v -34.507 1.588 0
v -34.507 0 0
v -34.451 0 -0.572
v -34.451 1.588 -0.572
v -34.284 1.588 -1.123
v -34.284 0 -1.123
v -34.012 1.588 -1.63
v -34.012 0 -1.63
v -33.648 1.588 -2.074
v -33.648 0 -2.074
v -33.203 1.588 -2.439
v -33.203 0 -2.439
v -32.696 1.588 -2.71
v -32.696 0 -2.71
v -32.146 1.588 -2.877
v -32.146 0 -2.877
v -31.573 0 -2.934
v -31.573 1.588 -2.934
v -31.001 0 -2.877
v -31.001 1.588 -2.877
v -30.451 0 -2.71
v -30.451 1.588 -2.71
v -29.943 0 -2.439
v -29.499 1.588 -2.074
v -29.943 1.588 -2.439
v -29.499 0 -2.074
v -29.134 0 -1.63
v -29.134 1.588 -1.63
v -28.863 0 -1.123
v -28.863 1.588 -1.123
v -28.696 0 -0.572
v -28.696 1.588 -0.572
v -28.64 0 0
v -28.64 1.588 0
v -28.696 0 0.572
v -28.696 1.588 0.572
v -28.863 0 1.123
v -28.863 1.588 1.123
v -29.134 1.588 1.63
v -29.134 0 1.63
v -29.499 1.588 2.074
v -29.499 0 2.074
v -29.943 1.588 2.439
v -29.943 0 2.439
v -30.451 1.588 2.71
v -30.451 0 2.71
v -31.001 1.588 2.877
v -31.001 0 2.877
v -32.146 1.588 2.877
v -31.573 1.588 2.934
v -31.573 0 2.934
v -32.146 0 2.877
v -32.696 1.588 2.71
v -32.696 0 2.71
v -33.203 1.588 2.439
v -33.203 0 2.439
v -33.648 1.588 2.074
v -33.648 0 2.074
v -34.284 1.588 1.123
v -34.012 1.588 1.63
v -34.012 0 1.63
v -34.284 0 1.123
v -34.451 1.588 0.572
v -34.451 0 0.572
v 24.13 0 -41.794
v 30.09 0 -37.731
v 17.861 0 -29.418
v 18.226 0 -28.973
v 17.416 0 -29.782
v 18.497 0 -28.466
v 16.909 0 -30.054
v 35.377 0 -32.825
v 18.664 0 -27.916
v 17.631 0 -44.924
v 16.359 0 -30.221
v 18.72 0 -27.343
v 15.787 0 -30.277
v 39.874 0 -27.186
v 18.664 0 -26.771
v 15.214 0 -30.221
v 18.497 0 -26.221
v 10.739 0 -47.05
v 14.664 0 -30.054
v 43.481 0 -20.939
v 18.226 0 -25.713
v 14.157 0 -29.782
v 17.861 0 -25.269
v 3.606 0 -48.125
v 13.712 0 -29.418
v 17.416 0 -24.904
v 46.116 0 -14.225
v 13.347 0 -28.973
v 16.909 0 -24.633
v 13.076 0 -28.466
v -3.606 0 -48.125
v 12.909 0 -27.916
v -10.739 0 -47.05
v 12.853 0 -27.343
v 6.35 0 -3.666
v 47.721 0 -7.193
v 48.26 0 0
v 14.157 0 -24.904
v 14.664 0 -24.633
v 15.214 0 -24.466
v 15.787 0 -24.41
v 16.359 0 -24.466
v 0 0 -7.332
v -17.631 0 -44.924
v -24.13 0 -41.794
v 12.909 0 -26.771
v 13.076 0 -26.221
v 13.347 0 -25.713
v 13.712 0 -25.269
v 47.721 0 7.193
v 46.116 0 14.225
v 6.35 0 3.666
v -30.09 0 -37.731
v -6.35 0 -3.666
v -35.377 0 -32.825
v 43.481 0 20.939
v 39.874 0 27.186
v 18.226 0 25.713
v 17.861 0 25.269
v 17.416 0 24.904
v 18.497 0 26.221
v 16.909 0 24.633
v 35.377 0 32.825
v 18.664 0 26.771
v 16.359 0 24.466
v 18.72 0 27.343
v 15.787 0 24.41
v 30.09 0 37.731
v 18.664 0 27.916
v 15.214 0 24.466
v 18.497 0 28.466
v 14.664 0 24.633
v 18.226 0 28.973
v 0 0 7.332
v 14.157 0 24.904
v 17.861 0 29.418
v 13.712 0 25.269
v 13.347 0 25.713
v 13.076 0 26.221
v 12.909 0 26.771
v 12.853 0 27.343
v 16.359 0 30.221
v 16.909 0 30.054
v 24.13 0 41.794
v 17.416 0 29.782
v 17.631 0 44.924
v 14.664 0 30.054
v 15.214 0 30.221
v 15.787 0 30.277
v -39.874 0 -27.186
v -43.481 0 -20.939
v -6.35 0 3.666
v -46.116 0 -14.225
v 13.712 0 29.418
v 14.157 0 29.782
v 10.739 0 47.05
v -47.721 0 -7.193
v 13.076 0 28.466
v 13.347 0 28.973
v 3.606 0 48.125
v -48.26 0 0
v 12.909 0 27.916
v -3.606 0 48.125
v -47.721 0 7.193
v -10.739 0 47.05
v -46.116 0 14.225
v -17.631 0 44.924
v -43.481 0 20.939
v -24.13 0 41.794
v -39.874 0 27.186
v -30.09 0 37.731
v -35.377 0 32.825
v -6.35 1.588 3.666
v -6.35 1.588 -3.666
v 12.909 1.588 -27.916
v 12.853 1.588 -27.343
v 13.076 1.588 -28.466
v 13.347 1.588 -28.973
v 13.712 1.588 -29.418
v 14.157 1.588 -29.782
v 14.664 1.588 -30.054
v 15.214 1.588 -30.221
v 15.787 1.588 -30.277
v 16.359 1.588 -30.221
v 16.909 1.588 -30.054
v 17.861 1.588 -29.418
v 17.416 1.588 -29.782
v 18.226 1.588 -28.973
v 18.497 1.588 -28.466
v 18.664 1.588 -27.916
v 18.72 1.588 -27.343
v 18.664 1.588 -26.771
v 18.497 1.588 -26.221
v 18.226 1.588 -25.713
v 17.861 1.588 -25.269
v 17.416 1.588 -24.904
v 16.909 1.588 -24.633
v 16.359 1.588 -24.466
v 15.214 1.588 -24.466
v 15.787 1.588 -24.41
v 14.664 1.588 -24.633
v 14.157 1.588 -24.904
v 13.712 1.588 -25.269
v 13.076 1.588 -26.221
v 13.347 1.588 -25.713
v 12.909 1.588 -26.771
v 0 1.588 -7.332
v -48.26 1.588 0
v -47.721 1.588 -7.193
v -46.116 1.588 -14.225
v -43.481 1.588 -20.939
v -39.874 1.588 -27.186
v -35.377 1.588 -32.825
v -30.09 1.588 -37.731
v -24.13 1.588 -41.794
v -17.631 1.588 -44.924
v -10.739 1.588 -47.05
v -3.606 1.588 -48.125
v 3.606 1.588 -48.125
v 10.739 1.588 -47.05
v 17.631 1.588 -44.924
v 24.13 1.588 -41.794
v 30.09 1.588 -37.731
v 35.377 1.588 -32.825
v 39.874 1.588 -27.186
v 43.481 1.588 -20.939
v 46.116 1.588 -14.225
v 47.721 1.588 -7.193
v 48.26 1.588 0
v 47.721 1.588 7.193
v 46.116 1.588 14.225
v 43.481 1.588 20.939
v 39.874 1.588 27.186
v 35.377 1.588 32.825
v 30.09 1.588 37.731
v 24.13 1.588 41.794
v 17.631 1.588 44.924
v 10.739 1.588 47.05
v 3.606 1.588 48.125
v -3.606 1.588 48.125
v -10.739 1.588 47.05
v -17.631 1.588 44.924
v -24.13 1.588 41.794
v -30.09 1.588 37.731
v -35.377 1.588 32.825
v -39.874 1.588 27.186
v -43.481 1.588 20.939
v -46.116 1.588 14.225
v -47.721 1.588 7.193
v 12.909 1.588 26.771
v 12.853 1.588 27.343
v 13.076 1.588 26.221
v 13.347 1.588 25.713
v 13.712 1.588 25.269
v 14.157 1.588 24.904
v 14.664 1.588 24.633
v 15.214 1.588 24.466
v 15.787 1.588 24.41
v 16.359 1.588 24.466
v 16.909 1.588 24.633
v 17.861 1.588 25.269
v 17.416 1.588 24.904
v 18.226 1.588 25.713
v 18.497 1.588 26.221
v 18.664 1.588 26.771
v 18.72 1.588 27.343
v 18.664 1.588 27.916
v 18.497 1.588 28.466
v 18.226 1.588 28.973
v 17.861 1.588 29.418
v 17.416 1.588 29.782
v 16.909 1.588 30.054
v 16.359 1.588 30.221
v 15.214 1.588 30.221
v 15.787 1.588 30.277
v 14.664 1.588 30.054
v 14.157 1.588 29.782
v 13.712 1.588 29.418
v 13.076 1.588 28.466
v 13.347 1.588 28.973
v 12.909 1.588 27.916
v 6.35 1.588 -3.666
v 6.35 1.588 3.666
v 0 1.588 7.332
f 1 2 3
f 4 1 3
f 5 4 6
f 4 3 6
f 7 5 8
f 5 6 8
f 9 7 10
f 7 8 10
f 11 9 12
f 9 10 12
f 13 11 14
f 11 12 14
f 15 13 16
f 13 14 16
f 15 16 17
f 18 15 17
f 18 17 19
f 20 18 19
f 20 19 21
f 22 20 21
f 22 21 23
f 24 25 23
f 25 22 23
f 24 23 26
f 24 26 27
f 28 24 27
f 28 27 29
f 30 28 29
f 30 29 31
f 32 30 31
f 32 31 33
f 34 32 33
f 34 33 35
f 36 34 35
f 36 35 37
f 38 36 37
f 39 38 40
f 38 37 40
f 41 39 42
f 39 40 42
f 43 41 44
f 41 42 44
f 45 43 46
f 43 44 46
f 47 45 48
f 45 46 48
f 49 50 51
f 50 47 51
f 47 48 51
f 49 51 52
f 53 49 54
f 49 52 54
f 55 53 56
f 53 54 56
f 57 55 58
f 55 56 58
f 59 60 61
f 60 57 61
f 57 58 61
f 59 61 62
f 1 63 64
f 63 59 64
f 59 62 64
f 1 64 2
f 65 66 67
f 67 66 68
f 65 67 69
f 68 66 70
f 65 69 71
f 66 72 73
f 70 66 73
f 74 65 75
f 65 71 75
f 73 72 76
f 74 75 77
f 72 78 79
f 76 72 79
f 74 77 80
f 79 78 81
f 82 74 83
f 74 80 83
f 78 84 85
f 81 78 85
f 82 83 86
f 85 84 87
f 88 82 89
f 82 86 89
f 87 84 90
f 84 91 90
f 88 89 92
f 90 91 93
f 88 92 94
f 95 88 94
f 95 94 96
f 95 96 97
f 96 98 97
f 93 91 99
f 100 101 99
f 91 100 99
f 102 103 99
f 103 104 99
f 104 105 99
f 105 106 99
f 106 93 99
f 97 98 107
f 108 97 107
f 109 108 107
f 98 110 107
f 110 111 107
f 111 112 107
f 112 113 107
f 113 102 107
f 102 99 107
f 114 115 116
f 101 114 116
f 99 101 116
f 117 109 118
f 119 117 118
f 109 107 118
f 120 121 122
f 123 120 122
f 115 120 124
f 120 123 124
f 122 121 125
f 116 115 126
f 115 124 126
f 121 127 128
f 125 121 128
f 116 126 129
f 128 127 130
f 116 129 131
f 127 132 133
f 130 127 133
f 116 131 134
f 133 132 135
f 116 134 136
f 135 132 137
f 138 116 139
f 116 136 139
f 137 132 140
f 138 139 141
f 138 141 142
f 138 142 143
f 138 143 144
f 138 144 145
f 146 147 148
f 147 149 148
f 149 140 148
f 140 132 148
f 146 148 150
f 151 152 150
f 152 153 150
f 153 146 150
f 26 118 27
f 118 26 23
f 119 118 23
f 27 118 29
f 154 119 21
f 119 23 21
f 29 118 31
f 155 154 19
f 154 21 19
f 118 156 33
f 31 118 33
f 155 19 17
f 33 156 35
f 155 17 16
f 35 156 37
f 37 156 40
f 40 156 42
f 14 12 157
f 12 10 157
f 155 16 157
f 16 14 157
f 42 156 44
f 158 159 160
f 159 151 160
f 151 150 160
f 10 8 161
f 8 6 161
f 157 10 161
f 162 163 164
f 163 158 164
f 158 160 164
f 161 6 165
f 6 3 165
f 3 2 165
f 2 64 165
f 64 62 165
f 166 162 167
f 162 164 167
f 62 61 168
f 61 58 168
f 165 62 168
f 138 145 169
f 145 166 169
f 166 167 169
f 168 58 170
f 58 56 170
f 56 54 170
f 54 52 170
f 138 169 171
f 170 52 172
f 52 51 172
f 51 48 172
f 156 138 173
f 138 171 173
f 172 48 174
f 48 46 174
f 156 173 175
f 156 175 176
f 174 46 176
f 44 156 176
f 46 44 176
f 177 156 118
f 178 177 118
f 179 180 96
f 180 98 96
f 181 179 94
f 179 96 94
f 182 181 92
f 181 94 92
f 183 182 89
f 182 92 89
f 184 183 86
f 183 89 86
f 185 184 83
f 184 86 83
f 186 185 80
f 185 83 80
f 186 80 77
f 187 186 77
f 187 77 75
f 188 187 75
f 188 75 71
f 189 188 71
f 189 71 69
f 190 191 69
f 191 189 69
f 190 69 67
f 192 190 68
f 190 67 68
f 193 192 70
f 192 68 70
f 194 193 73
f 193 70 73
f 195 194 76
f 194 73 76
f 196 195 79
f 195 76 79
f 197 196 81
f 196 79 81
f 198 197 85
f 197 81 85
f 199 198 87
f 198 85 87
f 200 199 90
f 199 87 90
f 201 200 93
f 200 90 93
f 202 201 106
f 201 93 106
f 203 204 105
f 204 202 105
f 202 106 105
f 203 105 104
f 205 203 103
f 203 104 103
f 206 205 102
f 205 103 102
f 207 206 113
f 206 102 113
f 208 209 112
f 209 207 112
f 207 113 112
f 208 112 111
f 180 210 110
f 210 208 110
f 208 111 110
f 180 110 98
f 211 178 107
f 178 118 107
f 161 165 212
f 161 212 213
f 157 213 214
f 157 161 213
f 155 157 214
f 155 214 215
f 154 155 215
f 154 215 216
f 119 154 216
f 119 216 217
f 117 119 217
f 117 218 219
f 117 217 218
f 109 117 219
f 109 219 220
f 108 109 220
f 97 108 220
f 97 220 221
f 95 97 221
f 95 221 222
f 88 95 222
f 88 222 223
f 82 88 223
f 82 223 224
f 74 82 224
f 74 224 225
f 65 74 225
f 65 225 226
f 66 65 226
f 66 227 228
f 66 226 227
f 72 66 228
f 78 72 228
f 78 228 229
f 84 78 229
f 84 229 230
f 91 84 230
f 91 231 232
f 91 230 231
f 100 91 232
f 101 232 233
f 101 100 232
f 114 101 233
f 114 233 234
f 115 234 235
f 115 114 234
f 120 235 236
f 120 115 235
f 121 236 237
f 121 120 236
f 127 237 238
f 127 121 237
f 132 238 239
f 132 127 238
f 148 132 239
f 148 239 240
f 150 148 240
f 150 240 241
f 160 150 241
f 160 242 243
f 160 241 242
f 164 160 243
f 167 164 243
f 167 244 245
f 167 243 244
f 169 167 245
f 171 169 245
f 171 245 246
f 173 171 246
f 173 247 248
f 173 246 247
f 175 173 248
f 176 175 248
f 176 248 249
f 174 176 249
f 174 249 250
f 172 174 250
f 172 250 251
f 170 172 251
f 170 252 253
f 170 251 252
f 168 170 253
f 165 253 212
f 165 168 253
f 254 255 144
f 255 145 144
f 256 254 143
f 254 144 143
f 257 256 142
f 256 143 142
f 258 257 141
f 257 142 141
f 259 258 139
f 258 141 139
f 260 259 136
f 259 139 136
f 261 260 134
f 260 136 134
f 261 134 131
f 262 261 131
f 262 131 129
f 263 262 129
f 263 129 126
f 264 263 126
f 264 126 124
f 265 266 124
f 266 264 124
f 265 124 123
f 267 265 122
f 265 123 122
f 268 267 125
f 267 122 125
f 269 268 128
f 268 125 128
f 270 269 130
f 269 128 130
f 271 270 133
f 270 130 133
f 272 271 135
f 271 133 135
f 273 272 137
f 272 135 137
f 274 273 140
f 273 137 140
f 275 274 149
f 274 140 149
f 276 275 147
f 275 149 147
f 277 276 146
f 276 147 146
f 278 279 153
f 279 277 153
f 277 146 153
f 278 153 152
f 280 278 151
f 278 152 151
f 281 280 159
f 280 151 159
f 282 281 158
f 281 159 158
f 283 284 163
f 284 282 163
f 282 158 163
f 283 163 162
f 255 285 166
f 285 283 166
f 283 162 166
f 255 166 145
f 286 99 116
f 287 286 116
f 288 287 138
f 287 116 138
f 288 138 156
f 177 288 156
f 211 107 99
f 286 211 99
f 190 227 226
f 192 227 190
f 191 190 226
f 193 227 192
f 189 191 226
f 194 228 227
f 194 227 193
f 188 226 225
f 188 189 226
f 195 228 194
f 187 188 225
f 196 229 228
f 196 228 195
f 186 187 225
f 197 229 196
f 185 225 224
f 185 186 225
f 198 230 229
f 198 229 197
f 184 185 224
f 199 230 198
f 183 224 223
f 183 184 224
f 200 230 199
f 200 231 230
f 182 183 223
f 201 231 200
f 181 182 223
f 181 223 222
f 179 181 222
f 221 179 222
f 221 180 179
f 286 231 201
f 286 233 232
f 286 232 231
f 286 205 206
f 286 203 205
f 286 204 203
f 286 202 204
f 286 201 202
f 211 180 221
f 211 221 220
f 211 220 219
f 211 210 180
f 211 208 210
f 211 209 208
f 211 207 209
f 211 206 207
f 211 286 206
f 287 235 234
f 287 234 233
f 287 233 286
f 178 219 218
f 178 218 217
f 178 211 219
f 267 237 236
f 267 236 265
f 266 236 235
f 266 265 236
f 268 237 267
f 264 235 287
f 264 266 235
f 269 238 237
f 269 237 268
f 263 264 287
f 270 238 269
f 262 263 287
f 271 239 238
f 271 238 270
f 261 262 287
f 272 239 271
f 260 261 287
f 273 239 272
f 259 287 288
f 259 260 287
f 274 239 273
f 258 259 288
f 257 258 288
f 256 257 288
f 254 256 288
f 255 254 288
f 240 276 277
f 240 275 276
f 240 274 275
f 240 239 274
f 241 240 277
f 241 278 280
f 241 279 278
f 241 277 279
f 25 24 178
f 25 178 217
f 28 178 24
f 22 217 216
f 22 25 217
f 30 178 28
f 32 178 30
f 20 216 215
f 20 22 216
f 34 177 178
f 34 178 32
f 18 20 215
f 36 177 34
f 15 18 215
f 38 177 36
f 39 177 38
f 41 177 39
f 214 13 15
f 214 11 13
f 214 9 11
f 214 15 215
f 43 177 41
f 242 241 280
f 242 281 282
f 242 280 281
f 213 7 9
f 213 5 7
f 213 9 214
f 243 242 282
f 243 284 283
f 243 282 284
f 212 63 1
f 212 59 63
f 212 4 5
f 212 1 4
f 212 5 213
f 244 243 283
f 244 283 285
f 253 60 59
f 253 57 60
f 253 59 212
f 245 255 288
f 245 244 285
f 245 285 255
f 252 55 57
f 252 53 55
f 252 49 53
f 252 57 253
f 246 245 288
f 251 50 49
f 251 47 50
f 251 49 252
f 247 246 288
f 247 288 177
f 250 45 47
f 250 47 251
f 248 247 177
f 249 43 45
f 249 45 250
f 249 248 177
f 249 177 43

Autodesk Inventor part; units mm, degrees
ref_plane "YZ Plane" through (0, 0, 0) normal (1, 0, 0) x (0, 1, 0)
ref_plane "XZ Plane" through (0, 0, 0) normal (0, 1, 0) x (-1, 0, 0)
ref_plane "XY Plane" through (0, 0, 0) normal (0, 0, 1) x (1, 0, 0)
sketch "Sketch1" plane through (0, 0, 0) normal (0, 1, 0) x (-1, 0, 0)
  line L0 (6.35, -3.6662) -> (0, -7.3323)
  line L1 (0, -7.3323) -> (-6.35, -3.6662)
  line L2 (-6.35, -3.6662) -> (-6.35, 3.6662)
  line L3 (-6.35, 3.6662) -> (0, 7.3323)
  line L4 (0, 7.3323) -> (6.35, 3.6662)
  line L5 (6.35, 3.6662) -> (6.35, -3.6662)
  circle A0 centre (0, 0) radius 38.1
  line L6 (31.5732, -7.3323) -> (25.2232, -3.6662)
  line L7 (25.2232, -3.6662) -> (25.2232, 3.6662)
  line L8 (25.2232, 3.6662) -> (31.5732, 7.3323)
  line L9 (31.5732, 7.3323) -> (37.9232, 3.6662)
  line L10 (37.9232, 3.6662) -> (37.9232, -3.6662)
  line L11 (37.9232, -3.6662) -> (31.5732, -7.3323)
  line L12 (-15.7866, -20.0108) -> (-9.4366, -23.677)
  line L13 (-9.4366, -23.677) -> (-9.4366, -31.0094)
  line L14 (-9.4366, -31.0094) -> (-15.7866, -34.6755)
  line L15 (-15.7866, -34.6755) -> (-22.1366, -31.0094)
  line L16 (-22.1366, -31.0094) -> (-22.1366, -23.677)
  line L17 (-22.1366, -23.677) -> (-15.7866, -20.0108)
  line L18 (-15.7866, 20.0108) -> (-22.1366, 23.677)
  line L19 (-22.1366, 23.677) -> (-22.1366, 31.0094)
  line L20 (-22.1366, 31.0094) -> (-15.7866, 34.6755)
  line L21 (-15.7866, 34.6755) -> (-9.4366, 31.0094)
  line L22 (-9.4366, 31.0094) -> (-9.4366, 23.677)
  line L23 (-9.4366, 23.677) -> (-15.7866, 20.0108)
  circle A1 centre (0, 0) radius 48.26
  circle A2 centre (31.5732, 0) radius 2.9337
  circle A3 centre (-15.7866, -27.3432) radius 2.9337
  circle A4 centre (-15.7866, 27.3432) radius 2.9337
  dimension "d0" = 6.35
  dimension "d1" = 76.2
  dimension "d2" = 120
  dimension "d3" = 120
  dimension "d4" = 10.16
  dimension "d5" = 5.8674
extrude "Extrusion1" add sketch "Sketch1" along normal blind 1.5875 contours A0 L10 | L9 L8 L7 L6 L11 A0 L14 L13 L12 L17 L16 L19 L18 L23 L22 L21 | L10 L11 L6 L7 L8 L9 | L20 A0 | L21 L22 L23 L18 L19 L20 | L15 L16 L17 L12 L13 L14 | A0 L15 | A1
properties part number "spoolEnd"
